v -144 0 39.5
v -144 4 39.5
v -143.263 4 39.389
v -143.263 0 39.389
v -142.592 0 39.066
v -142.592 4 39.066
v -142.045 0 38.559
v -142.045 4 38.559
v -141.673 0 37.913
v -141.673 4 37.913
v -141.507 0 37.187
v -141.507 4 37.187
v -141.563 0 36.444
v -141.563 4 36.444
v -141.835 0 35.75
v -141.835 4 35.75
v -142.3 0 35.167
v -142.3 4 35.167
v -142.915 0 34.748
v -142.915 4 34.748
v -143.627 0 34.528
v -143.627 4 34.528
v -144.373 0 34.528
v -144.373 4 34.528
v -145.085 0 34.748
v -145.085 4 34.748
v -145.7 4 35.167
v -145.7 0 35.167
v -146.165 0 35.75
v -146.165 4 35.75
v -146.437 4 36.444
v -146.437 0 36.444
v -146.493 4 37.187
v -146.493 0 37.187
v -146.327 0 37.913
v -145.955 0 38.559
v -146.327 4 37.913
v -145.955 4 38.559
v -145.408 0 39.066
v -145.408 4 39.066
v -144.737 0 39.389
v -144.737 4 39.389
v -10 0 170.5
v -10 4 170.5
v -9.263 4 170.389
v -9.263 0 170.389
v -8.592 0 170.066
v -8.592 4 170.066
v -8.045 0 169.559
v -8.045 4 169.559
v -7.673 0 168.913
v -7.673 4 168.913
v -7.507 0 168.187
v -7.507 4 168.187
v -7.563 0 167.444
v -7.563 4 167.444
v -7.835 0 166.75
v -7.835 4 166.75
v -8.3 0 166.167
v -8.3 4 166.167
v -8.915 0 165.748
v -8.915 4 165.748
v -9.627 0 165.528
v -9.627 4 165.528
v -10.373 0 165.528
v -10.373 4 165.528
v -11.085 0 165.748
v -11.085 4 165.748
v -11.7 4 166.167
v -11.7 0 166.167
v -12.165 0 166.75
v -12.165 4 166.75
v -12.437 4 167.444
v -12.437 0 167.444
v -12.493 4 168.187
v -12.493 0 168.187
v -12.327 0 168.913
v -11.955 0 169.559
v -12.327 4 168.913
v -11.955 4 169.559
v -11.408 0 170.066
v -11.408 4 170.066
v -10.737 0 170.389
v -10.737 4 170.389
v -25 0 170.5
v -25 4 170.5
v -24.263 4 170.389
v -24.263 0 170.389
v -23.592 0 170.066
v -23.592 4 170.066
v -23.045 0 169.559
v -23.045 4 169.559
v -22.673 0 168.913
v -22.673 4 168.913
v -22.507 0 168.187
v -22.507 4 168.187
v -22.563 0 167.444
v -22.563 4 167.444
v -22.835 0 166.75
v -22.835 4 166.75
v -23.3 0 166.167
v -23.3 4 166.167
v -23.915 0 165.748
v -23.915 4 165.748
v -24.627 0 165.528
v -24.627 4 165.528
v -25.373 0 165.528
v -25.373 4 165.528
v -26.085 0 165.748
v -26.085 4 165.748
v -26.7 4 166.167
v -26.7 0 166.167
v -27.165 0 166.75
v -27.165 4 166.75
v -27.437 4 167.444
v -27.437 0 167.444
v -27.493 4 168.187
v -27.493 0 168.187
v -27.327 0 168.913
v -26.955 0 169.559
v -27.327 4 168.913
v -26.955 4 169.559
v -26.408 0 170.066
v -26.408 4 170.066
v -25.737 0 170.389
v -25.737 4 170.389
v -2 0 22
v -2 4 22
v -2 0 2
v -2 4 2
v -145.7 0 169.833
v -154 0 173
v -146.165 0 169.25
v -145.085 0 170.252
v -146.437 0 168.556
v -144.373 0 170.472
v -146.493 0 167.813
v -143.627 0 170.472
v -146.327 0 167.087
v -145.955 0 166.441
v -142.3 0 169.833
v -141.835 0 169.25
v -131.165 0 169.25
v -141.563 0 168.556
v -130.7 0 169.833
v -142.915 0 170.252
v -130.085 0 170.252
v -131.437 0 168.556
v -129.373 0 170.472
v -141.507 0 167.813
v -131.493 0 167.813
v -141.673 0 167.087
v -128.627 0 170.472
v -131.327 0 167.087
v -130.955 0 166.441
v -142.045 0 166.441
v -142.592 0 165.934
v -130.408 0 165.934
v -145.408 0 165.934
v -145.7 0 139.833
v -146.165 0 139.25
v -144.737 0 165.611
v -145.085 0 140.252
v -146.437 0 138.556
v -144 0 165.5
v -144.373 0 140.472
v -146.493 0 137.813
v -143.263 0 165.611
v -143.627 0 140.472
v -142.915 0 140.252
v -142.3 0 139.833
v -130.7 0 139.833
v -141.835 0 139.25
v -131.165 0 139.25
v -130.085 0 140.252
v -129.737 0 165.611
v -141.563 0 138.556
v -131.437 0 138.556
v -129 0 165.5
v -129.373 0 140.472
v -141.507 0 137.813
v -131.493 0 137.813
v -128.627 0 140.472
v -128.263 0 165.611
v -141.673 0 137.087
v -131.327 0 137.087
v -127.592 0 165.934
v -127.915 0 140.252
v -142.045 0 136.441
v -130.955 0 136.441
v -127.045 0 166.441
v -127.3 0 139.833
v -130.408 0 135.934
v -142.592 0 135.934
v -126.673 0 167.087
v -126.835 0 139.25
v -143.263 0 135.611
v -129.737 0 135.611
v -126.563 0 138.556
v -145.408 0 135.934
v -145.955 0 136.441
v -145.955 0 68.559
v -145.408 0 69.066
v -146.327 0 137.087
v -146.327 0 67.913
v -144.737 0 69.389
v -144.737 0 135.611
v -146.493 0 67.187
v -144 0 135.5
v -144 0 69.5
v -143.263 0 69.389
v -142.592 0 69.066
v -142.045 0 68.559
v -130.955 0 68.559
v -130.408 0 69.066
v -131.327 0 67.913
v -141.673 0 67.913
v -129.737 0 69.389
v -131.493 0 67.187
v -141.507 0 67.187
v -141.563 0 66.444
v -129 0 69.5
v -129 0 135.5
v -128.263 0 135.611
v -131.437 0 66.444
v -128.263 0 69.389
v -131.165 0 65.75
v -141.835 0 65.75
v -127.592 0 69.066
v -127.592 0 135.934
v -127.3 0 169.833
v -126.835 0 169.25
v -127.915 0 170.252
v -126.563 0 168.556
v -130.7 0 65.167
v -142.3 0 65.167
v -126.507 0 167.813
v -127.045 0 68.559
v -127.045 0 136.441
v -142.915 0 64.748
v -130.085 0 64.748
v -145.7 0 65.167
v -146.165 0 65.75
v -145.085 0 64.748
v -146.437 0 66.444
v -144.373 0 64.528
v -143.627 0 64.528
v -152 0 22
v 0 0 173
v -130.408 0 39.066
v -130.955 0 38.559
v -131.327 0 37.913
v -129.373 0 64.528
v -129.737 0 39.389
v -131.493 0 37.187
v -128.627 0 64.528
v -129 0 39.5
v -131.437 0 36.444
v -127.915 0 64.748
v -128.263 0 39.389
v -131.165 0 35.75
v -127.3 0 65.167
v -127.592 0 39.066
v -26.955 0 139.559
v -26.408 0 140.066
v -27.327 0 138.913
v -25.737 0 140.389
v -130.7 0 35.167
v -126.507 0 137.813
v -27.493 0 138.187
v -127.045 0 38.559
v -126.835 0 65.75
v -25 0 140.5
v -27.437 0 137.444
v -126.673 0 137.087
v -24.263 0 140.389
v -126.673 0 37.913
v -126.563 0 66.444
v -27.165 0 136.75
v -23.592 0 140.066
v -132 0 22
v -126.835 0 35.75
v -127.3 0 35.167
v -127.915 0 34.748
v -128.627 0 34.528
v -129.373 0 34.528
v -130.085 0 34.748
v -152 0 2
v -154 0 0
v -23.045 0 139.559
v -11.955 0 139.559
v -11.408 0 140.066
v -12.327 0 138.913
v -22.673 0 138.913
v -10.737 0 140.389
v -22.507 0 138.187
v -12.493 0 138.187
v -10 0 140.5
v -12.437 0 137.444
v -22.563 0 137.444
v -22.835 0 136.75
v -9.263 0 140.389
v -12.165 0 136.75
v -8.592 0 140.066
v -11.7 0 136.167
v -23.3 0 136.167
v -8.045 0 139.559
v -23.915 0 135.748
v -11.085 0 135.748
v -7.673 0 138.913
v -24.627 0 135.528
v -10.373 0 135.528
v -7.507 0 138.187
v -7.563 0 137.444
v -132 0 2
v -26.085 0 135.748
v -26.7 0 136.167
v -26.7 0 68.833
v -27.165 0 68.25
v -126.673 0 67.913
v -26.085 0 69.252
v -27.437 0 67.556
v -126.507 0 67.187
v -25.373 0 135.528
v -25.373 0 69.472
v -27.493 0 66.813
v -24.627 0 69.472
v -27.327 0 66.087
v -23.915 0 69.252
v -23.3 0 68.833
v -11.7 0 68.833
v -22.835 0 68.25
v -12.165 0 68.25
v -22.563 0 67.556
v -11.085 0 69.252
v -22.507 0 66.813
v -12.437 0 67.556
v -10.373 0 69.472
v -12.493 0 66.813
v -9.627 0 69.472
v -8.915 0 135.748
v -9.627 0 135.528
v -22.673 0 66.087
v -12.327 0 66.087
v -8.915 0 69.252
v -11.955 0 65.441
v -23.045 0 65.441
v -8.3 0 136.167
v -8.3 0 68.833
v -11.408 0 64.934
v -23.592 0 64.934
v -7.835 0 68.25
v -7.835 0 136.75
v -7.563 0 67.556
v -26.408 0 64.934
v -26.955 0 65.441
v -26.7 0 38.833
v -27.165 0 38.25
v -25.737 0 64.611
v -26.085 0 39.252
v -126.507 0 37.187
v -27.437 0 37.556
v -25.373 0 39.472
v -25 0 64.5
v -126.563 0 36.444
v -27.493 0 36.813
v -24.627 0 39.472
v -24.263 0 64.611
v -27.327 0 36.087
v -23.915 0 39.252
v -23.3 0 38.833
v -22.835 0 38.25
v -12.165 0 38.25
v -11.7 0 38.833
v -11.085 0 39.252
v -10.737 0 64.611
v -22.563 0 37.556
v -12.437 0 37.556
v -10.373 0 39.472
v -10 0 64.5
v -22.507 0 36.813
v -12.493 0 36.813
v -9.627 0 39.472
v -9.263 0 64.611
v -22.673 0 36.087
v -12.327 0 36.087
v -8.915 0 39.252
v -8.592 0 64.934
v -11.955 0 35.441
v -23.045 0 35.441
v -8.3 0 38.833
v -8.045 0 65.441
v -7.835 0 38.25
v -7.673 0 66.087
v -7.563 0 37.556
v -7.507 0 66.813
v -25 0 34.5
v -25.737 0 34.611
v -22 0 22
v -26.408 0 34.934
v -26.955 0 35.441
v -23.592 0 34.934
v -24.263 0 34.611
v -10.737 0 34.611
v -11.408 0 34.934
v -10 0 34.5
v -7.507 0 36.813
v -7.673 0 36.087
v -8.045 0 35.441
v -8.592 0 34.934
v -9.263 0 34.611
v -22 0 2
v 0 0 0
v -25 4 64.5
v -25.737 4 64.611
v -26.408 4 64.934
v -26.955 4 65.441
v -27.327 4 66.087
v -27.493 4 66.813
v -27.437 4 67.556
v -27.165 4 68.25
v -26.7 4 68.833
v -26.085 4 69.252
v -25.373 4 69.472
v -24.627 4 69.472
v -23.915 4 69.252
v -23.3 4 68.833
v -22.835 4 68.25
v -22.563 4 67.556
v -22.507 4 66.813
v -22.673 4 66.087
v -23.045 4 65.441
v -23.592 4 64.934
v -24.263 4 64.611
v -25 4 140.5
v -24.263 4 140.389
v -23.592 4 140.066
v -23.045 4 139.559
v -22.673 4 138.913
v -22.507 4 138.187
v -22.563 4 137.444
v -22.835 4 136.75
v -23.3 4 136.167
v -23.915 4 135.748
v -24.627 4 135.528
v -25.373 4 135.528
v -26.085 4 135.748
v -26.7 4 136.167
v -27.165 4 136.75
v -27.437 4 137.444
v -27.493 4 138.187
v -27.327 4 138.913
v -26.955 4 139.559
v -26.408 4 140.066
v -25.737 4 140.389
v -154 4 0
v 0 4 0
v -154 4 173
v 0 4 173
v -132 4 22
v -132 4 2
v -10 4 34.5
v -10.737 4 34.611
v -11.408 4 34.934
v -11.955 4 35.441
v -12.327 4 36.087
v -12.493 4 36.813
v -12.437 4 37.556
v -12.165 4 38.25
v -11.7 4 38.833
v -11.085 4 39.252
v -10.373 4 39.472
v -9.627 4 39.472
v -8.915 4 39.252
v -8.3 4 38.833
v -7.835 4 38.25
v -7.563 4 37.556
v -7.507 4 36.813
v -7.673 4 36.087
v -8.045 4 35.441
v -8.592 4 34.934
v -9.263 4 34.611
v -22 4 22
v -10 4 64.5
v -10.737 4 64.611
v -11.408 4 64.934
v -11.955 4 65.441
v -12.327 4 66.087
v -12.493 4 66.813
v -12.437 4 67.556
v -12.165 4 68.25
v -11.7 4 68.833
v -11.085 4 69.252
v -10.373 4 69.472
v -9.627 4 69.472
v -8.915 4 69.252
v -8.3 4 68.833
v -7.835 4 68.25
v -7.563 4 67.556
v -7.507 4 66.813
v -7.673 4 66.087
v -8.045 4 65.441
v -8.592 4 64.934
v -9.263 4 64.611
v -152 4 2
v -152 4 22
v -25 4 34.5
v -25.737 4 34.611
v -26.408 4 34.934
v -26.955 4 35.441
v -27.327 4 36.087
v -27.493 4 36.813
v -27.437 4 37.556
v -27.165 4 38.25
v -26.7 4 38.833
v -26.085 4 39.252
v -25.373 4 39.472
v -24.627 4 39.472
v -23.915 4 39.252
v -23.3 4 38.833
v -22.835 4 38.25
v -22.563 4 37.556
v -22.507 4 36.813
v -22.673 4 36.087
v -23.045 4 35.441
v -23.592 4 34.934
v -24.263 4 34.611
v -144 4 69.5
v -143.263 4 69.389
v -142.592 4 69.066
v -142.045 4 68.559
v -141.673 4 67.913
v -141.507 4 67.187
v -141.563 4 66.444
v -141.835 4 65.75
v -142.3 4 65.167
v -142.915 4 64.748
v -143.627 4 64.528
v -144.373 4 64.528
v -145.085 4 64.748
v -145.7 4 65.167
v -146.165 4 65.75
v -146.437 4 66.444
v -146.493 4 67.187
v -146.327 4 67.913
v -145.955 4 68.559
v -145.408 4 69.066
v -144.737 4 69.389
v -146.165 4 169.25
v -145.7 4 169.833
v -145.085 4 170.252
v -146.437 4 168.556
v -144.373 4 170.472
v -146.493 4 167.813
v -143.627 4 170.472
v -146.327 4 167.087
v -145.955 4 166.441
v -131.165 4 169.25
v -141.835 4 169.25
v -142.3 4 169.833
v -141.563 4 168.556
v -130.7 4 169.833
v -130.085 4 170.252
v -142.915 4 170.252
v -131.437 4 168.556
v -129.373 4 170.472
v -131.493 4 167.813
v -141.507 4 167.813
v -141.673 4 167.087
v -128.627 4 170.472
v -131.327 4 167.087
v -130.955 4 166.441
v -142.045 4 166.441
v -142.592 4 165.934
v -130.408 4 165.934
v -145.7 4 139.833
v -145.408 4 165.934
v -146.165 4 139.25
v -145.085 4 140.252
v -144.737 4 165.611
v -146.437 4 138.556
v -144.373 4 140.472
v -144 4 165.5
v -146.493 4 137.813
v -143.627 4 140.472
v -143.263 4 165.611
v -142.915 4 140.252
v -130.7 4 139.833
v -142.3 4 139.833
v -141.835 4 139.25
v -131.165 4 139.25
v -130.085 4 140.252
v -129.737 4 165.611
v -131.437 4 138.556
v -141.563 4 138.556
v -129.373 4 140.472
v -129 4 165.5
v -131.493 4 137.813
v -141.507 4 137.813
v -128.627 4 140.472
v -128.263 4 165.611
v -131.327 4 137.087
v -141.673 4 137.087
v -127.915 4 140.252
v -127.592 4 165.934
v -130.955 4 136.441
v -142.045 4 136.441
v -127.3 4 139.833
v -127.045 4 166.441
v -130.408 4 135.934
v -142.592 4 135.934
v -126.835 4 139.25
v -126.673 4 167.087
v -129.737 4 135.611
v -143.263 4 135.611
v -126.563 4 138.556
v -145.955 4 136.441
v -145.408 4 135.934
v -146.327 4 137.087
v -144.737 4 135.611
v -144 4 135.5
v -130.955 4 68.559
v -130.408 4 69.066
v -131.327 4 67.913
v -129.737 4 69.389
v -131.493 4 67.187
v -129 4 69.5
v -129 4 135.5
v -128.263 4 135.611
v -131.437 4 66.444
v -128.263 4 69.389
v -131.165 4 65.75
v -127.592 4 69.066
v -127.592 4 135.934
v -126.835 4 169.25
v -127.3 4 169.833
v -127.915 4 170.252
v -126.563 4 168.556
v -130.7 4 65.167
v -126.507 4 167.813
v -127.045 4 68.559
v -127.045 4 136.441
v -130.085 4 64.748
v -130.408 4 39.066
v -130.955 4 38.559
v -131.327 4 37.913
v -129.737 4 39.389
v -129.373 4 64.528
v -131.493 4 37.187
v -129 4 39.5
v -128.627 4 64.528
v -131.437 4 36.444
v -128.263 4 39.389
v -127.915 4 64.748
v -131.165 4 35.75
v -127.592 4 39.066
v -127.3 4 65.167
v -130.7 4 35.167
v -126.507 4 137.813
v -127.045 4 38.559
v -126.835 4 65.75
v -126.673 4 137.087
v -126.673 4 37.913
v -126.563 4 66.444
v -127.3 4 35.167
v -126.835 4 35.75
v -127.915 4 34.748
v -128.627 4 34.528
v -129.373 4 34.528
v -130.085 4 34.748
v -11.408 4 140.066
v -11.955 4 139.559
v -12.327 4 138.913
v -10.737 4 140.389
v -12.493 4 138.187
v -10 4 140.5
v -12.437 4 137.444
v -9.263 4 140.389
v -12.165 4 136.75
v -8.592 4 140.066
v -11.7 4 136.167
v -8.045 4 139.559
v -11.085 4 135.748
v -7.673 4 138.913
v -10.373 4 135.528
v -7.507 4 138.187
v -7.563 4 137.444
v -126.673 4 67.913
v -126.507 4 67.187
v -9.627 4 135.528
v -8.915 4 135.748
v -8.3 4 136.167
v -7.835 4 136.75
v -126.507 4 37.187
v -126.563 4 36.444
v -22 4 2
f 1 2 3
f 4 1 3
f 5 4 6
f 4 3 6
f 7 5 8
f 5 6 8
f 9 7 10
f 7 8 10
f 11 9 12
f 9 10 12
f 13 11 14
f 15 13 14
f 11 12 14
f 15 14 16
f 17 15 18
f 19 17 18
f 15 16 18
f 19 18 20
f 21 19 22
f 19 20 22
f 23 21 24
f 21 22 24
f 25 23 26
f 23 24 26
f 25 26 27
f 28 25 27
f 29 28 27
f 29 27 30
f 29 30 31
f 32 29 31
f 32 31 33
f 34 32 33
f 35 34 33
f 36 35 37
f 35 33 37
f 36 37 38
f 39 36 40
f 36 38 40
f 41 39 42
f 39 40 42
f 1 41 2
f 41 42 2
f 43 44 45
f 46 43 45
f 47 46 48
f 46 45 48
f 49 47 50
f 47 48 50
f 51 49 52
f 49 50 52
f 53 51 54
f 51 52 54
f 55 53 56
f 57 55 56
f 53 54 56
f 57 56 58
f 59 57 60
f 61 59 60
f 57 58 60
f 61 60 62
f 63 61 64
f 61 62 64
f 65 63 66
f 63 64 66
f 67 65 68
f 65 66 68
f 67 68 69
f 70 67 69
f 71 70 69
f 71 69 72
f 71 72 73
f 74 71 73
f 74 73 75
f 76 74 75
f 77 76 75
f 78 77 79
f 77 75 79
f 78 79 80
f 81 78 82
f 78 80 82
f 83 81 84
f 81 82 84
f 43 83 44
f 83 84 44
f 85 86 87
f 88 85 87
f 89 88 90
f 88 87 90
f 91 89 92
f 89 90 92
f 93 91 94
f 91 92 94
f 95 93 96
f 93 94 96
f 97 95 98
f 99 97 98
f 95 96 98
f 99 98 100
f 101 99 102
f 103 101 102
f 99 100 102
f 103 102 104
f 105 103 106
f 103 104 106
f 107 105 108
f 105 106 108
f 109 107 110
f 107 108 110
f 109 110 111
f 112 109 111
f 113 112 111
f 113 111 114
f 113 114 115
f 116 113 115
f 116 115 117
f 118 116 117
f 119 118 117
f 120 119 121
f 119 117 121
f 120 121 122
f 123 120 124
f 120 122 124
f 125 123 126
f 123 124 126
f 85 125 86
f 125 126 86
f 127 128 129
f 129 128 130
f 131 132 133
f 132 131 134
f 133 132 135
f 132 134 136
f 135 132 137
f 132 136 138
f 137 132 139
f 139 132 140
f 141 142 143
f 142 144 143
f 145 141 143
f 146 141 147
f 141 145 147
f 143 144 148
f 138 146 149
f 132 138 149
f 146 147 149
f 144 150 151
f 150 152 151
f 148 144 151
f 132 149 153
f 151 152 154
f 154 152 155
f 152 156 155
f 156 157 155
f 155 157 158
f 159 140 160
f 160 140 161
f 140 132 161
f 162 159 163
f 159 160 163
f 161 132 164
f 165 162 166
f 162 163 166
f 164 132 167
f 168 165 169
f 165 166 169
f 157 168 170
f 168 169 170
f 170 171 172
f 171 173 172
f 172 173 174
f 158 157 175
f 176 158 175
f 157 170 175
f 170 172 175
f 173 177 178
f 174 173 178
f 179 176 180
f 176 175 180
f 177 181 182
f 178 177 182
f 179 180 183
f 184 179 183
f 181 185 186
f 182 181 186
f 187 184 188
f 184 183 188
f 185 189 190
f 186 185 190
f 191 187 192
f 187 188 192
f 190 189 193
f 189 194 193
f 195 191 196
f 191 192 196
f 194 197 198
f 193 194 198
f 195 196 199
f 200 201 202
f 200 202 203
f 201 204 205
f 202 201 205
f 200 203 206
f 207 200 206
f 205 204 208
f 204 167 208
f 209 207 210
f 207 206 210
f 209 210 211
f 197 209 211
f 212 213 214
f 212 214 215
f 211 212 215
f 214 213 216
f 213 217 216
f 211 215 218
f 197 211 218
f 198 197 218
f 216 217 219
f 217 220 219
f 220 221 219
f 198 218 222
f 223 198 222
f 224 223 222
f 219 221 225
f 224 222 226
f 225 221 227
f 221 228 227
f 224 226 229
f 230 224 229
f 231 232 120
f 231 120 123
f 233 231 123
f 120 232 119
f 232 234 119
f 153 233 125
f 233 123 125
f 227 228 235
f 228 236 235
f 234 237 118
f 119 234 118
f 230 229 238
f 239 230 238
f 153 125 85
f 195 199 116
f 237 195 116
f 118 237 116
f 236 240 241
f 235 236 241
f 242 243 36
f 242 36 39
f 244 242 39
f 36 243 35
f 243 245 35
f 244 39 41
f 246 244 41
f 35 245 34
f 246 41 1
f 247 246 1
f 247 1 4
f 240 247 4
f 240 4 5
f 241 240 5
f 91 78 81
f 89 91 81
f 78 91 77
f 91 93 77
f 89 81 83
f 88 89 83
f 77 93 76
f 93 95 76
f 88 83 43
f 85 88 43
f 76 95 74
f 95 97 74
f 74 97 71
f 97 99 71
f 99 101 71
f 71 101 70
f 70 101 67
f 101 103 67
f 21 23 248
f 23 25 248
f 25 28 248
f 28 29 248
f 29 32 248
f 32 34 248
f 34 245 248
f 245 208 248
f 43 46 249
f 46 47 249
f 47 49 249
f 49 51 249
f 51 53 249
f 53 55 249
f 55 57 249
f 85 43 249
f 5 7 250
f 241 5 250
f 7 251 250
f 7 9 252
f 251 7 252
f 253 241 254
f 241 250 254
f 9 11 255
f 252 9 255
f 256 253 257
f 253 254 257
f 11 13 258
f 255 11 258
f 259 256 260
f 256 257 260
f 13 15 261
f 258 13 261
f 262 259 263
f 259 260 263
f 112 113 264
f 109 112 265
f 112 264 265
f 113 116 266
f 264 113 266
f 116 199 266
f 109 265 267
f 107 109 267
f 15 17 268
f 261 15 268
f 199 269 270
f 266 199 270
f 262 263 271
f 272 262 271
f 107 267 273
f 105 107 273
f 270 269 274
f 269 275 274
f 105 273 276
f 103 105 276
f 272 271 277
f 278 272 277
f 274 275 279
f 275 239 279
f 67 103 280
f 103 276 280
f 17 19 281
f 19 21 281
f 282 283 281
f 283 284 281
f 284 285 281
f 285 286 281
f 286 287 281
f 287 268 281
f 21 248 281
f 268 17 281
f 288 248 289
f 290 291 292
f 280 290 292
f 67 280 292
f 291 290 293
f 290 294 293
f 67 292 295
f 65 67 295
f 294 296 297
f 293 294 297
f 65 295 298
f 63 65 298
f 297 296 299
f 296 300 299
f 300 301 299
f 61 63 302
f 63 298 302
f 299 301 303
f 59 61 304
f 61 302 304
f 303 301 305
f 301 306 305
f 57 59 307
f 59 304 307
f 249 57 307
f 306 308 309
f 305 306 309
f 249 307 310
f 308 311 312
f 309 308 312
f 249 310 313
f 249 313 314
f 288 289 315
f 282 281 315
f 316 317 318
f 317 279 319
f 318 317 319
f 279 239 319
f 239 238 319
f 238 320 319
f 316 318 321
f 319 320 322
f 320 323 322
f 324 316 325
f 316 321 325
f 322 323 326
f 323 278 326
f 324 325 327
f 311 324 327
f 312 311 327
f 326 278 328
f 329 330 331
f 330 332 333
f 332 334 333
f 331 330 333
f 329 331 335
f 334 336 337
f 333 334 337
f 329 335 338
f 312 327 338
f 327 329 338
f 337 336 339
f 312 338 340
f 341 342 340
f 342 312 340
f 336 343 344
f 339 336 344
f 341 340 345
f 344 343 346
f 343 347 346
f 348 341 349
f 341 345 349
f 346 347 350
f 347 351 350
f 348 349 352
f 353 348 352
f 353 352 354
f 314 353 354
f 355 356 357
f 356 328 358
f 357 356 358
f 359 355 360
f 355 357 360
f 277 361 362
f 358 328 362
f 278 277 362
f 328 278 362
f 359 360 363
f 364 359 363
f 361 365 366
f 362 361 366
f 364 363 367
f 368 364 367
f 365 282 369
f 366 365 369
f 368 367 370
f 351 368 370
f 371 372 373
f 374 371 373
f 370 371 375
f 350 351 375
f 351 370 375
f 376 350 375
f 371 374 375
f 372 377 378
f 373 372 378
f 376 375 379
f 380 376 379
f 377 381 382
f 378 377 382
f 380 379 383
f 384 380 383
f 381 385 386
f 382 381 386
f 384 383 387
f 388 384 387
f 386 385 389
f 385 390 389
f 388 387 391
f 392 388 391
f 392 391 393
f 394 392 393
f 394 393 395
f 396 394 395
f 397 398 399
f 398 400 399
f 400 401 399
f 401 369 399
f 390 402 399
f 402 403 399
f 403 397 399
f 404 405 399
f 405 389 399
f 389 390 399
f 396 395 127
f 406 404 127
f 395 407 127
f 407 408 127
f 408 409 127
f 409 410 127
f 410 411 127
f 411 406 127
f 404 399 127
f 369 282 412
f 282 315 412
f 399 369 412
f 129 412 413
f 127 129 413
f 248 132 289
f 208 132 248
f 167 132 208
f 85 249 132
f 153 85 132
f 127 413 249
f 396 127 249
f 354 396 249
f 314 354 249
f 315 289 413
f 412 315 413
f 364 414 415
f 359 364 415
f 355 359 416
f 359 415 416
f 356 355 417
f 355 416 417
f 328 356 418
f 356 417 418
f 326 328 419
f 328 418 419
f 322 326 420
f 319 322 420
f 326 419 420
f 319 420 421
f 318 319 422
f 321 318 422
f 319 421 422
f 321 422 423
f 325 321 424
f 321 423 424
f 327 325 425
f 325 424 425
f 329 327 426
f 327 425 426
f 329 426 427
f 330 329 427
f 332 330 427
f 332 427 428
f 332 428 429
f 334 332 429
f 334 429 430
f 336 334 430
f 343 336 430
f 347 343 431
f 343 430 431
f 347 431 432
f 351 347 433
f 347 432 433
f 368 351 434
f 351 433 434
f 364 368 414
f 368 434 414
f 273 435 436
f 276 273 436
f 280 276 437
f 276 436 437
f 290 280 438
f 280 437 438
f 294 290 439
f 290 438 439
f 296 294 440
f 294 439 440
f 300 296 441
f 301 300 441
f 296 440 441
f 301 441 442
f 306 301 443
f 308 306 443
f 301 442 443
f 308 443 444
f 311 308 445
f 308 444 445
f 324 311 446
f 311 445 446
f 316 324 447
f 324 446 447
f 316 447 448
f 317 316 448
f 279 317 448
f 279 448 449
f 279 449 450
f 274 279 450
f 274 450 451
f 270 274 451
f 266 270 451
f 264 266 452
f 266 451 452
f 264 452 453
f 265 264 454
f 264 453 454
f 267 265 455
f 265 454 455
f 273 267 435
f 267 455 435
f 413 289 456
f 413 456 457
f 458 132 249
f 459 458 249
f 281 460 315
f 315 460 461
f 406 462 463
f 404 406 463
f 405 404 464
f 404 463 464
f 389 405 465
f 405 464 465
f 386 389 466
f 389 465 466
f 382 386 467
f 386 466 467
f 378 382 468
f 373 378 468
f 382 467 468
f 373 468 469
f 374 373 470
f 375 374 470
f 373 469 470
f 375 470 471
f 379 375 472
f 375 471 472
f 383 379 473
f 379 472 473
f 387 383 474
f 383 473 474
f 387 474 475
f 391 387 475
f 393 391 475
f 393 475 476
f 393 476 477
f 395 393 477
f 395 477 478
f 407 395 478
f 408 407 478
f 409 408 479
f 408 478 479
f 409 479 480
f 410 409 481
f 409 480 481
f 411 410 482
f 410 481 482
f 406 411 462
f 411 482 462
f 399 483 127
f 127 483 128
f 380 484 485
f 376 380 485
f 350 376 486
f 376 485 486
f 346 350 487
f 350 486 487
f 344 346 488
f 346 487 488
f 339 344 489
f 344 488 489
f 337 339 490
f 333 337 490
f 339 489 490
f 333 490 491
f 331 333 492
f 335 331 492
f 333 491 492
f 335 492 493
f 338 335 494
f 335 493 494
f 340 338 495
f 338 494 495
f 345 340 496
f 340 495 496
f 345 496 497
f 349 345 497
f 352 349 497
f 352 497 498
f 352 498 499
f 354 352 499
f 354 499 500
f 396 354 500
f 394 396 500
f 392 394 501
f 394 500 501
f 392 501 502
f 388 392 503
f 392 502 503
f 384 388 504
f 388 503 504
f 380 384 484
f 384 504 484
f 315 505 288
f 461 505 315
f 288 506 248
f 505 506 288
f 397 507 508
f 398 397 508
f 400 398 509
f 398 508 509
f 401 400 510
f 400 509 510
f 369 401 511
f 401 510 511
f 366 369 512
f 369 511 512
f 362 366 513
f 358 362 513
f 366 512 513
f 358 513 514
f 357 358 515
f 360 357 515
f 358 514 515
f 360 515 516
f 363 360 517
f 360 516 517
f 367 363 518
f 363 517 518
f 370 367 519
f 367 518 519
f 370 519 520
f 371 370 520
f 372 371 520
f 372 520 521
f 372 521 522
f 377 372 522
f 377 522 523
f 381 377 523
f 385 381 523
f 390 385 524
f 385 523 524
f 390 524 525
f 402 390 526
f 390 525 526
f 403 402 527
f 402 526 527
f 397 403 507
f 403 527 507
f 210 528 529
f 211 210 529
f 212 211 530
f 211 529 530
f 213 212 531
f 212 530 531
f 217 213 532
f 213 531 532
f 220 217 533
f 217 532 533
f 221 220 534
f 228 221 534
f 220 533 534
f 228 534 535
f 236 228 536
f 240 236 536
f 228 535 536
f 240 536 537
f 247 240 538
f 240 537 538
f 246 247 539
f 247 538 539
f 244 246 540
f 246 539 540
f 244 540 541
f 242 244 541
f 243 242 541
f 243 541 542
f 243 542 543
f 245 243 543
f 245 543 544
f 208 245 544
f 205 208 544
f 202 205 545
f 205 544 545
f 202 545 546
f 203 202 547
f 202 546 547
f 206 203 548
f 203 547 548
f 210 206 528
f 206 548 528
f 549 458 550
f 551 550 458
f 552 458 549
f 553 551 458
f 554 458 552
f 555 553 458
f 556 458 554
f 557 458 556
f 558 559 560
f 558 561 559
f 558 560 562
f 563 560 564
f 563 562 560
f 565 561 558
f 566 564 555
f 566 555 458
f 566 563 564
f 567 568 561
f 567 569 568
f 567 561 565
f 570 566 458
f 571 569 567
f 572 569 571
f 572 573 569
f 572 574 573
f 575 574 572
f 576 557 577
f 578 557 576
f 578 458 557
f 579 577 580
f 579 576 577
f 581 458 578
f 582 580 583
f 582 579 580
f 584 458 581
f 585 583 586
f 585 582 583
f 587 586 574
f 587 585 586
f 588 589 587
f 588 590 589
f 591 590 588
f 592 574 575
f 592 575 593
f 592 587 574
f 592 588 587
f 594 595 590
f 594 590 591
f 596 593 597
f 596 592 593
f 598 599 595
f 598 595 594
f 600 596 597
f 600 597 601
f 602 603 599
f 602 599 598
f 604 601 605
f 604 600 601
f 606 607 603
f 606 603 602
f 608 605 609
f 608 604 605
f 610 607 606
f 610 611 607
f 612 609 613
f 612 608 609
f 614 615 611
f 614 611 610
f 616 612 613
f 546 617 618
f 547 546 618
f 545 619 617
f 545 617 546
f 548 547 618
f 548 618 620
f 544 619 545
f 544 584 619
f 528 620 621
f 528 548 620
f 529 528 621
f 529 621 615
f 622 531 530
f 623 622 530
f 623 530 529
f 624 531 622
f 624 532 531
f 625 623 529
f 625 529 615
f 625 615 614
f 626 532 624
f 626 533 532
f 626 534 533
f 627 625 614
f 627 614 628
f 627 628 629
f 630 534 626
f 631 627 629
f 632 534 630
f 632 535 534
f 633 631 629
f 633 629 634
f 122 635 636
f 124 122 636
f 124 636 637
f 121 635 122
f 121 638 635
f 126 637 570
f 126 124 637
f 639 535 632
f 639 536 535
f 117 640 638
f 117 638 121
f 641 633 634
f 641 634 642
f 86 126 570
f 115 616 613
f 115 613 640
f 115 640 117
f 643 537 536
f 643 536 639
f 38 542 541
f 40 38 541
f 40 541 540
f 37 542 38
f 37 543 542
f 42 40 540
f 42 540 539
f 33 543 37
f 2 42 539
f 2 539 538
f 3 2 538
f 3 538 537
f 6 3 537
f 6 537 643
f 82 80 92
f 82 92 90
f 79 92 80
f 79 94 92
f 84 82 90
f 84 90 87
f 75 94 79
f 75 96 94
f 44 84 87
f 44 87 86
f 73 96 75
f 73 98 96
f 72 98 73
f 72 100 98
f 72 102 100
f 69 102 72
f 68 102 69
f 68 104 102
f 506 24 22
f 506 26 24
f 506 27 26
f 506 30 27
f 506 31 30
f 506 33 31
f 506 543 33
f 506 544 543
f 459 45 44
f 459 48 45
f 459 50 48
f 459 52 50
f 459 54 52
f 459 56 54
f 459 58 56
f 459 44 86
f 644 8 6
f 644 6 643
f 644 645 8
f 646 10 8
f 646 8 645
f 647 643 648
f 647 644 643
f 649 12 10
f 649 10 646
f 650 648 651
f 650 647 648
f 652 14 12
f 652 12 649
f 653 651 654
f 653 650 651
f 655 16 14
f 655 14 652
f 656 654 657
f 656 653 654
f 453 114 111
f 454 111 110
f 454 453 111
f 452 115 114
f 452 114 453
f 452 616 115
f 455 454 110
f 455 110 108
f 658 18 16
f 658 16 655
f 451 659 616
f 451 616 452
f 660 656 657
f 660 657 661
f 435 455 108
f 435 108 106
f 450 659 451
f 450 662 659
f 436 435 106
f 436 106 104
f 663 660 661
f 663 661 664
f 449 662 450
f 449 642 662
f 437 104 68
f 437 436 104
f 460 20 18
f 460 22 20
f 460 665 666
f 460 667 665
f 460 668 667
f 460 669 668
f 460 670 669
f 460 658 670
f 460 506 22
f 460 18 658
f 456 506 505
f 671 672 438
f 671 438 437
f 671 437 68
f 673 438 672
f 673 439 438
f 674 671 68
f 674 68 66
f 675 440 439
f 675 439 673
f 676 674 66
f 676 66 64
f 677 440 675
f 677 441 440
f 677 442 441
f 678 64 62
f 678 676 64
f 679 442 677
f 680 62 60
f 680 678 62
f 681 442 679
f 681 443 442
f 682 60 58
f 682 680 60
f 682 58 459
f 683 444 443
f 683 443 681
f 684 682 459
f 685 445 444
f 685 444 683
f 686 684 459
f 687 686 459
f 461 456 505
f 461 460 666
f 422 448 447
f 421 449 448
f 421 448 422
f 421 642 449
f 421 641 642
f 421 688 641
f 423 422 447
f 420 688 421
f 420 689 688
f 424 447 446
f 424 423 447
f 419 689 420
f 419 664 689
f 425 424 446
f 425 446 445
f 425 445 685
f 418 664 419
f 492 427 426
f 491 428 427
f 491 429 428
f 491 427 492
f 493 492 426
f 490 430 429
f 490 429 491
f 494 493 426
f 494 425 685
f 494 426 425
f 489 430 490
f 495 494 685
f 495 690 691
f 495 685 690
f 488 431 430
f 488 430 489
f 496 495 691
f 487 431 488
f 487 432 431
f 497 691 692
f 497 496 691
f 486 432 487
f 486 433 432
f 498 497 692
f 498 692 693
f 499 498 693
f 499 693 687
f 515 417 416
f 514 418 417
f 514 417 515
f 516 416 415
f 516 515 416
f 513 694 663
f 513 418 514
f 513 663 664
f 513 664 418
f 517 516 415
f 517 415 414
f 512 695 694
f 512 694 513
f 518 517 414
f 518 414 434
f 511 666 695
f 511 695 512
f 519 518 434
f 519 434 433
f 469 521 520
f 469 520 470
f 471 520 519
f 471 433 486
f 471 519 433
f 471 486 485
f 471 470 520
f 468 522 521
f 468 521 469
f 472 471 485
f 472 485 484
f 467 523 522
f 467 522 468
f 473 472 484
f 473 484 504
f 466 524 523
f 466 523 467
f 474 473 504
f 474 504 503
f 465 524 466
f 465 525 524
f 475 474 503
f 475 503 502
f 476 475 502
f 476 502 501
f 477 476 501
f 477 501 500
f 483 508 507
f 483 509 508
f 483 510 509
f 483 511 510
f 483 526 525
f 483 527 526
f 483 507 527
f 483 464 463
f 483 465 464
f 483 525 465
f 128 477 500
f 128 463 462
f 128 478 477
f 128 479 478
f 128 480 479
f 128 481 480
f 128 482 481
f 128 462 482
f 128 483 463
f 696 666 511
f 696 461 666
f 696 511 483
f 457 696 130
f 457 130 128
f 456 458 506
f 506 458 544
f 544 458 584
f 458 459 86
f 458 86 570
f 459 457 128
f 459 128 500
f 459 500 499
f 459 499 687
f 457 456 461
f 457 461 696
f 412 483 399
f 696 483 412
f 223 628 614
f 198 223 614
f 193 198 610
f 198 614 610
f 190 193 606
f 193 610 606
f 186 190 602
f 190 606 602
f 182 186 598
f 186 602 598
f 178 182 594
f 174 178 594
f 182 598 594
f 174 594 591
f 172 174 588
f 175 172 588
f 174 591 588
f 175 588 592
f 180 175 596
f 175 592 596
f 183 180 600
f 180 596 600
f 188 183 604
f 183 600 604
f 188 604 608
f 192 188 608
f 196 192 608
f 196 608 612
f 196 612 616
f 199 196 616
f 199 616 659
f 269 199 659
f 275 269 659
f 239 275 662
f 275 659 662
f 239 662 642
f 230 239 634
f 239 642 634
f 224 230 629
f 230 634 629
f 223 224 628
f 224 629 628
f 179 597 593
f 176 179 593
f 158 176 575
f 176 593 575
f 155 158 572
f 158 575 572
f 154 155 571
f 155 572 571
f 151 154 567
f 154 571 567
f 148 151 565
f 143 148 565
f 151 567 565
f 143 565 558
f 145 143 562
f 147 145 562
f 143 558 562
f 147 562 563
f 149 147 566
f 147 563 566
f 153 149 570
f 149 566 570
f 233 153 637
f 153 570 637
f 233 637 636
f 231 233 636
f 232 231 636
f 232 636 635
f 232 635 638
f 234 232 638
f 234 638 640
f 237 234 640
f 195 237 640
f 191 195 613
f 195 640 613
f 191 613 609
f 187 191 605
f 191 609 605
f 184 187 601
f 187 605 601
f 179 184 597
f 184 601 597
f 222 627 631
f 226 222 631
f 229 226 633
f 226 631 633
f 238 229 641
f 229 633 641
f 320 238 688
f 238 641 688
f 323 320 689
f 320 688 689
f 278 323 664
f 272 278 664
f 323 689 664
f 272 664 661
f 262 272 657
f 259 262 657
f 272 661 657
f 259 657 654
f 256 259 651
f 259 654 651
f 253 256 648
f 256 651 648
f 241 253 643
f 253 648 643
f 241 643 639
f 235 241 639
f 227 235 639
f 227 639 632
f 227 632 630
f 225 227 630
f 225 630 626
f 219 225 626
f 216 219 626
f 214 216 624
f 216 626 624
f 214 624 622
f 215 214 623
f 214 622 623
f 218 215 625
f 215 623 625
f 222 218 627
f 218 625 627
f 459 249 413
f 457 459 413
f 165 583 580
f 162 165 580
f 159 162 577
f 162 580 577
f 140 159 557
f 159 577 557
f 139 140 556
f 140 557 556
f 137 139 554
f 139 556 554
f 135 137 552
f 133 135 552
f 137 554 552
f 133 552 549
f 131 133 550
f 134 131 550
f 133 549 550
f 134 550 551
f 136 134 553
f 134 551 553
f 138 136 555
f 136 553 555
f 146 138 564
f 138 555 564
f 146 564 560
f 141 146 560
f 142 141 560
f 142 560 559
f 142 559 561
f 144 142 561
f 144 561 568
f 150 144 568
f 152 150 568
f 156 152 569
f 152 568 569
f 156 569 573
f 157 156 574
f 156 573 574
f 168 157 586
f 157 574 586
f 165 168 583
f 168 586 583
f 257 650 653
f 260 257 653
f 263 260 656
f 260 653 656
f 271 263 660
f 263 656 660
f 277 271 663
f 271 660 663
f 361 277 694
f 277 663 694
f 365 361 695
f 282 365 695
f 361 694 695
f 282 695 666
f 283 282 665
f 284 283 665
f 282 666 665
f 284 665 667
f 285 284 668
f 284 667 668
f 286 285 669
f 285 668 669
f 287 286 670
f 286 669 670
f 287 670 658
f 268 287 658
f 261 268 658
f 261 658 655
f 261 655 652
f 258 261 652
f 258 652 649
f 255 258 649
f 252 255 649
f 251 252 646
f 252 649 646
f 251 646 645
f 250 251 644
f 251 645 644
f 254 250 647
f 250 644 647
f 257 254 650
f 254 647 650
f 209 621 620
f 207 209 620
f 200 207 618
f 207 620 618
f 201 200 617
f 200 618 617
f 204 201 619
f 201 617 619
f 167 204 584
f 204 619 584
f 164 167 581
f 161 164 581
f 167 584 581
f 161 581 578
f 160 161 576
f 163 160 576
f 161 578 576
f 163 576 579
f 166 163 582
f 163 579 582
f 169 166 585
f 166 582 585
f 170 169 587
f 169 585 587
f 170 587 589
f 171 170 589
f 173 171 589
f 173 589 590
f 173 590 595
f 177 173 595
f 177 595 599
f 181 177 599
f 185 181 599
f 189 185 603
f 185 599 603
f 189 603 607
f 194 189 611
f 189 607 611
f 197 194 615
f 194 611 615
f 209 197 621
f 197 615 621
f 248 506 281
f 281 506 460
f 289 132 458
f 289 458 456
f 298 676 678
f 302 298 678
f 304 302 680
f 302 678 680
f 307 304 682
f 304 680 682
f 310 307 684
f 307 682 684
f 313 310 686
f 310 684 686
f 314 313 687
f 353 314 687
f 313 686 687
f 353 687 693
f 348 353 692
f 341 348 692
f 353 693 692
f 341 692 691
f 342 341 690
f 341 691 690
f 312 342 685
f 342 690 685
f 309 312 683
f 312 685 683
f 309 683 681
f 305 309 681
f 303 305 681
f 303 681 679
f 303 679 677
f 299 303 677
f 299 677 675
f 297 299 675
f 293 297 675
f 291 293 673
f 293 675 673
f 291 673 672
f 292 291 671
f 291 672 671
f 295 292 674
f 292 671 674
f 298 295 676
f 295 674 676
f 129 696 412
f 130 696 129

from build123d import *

# Parameters (mm, degrees)
SKETCH1_W           = 154
SKETCH1_H           = 173
BOSS_EXTRUDE1_DEPTH = 4
SKETCH2_R           = 2.5
SKETCH2_W           = 20
SKETCH2_H           = 20
CUT_EXTRUDE1_DEPTH  = 4


with BuildPart() as part:
    # Sketch1 → Boss-Extrude1 (new body)
    with BuildSketch(Plane(origin=(0, 0, 0), x_dir=(1, 0, 0), z_dir=(0, 1, 0))):
        with Locations((-77, -86.5)):
            Rectangle(SKETCH1_W, SKETCH1_H)
    extrude(amount=BOSS_EXTRUDE1_DEPTH)

    # Sketch2 → Cut-Extrude1 (cut)
    with BuildSketch(Plane(origin=(0, 4, 0), x_dir=(1, 0, 0), z_dir=(0, 1, 0))):
        with Locations(Location((-144, -37, 0), (0, 0, 270))):
            Circle(SKETCH2_R)
        with Locations(Location((-129, -37, 0), (0, 0, 270))):
            Circle(SKETCH2_R)
        with Locations(Location((-144, -67, 0), (0, 0, 270))):
            Circle(SKETCH2_R)
        with Locations(Location((-129, -67, 0), (0, 0, 270))):
            Circle(SKETCH2_R)
        with Locations(Location((-25, -67, 0), (0, 0, 90))):
            Circle(SKETCH2_R)
        with Locations(Location((-10, -67, 0), (0, 0, 90))):
            Circle(SKETCH2_R)
        with Locations(Location((-25, -37, 0), (0, 0, 90))):
            Circle(SKETCH2_R)
        with Locations(Location((-10, -37, 0), (0, 0, 90))):
            Circle(SKETCH2_R)
        with Locations(Location((-10, -168, 0), (0, 0, 270))):
            Circle(SKETCH2_R)
        with Locations(Location((-25, -168, 0), (0, 0, 270))):
            Circle(SKETCH2_R)
        with Locations(Location((-10, -138, 0), (0, 0, 270))):
            Circle(SKETCH2_R)
        with Locations(Location((-25, -138, 0), (0, 0, 270))):
            Circle(SKETCH2_R)
        with Locations(Location((-129, -138, 0), (0, 0, 90))):
            Circle(SKETCH2_R)
        with Locations(Location((-144, -138, 0), (0, 0, 90))):
            Circle(SKETCH2_R)
        with Locations(Location((-129, -168, 0), (0, 0, 90))):
            Circle(SKETCH2_R)
        with Locations(Location((-144, -168, 0), (0, 0, 90))):
            Circle(SKETCH2_R)
        with Locations((-142, -12)):
            Rectangle(SKETCH2_W, SKETCH2_H)
        with Locations((-12, -12)):
            Rectangle(SKETCH2_W, SKETCH2_H)
    extrude(amount=-CUT_EXTRUDE1_DEPTH, mode=Mode.SUBTRACT)


solid = part.part
